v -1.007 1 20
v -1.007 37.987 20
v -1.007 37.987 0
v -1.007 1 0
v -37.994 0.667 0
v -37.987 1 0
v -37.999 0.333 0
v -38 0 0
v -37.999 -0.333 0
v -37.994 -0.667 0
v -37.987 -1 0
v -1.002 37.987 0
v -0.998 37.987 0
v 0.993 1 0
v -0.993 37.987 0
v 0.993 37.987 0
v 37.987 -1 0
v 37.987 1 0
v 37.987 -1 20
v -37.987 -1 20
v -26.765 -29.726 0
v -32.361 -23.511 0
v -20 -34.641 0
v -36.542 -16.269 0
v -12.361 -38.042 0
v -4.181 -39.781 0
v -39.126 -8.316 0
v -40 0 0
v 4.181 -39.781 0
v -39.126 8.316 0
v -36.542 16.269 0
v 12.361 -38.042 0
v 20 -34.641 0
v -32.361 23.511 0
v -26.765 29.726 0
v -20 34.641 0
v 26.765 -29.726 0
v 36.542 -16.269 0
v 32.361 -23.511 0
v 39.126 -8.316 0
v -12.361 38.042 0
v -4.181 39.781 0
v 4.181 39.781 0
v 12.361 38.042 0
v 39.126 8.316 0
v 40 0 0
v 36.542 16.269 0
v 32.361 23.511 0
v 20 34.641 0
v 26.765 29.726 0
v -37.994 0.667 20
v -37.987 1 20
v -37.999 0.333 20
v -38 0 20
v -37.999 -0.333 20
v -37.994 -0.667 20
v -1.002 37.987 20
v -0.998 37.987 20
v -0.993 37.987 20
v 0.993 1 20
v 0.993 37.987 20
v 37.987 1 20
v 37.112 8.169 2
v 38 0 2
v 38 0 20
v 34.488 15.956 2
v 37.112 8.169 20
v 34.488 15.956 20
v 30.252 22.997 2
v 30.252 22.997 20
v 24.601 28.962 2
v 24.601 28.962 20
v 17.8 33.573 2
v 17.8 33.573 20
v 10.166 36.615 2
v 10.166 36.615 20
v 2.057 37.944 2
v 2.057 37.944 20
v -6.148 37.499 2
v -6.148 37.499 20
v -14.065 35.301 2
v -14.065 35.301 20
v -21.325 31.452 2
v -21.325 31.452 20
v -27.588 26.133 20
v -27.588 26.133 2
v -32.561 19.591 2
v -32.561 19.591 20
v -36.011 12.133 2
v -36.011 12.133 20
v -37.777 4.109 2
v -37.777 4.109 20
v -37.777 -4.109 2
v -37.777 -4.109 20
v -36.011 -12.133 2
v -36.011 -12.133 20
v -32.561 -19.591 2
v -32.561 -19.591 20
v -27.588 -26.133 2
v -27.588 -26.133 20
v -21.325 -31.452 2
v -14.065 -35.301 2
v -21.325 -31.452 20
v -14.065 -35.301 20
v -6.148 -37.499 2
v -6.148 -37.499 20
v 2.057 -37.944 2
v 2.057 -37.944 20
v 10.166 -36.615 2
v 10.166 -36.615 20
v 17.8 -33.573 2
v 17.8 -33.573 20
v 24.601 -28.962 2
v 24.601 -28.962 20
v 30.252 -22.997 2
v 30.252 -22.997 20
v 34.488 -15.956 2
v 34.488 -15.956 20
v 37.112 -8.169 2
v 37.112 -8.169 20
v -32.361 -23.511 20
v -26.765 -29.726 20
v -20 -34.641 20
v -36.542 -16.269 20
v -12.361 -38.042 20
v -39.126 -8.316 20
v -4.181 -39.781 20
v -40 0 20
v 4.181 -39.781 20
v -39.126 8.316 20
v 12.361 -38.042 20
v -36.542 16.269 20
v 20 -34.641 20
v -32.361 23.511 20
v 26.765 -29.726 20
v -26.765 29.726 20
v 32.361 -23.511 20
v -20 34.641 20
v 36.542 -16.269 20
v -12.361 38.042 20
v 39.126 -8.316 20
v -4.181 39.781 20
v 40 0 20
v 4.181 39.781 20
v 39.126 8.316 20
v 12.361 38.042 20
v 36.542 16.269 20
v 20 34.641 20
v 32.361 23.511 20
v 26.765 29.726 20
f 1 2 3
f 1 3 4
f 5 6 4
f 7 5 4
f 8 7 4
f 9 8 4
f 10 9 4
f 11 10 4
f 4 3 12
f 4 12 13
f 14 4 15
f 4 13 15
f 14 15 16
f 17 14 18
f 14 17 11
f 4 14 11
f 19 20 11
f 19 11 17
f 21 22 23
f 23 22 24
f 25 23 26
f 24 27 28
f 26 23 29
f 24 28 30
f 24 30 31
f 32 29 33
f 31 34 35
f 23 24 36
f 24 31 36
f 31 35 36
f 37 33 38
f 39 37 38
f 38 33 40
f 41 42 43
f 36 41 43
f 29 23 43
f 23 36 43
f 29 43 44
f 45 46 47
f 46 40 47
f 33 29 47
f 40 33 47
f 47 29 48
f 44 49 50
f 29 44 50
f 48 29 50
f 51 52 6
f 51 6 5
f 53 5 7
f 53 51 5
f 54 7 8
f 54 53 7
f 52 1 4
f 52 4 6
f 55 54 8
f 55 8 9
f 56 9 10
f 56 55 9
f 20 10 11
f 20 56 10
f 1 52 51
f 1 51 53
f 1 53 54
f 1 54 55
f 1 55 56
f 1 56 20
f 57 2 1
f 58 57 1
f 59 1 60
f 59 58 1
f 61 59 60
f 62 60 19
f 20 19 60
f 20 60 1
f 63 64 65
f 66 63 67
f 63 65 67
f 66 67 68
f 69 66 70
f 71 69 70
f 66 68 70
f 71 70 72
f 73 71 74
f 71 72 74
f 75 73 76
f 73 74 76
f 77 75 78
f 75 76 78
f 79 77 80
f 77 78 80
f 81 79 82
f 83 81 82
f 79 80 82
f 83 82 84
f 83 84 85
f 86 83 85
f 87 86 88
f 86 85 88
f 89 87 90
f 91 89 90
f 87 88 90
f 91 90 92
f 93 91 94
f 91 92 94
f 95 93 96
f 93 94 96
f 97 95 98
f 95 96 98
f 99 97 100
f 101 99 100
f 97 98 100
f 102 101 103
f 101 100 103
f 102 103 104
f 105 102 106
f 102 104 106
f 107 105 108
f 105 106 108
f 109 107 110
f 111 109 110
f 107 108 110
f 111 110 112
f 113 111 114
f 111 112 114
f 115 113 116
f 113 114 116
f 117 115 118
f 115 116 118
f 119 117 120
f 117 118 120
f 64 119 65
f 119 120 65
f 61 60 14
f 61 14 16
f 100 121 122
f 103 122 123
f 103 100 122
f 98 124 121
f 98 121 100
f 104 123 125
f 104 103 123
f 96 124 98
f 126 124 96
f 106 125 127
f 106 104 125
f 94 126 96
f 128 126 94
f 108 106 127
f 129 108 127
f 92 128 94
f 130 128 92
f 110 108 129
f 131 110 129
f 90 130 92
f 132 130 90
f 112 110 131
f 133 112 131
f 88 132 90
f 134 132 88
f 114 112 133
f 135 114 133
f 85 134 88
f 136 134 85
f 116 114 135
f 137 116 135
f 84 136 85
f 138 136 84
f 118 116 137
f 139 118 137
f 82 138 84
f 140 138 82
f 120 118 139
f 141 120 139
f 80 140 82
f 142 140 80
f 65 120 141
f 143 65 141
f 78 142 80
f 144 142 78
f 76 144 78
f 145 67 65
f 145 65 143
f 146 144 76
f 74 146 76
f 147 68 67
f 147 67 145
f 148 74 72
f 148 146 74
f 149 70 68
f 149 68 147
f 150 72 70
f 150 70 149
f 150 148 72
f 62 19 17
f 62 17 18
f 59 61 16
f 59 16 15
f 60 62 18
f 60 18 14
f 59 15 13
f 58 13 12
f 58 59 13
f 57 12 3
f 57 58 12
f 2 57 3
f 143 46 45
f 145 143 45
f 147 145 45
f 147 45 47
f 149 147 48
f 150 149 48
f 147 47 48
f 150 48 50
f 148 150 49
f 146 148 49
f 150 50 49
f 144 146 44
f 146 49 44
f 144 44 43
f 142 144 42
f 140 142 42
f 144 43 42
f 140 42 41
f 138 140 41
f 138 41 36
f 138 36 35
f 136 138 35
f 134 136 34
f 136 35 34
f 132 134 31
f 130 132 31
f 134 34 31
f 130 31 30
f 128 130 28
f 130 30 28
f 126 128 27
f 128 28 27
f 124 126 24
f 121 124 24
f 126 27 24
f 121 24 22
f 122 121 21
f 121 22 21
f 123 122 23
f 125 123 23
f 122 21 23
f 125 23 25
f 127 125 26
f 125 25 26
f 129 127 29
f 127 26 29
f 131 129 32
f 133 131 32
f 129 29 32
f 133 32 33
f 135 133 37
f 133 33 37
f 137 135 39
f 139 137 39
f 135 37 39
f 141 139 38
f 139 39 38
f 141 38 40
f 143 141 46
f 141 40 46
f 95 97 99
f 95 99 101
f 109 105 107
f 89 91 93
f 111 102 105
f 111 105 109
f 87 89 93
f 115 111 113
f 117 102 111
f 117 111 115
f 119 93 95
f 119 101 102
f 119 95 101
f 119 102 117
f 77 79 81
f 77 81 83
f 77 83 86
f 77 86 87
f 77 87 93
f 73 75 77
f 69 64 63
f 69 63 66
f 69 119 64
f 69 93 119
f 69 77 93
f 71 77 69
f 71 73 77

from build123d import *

# Parameters (mm, degrees)
F0_R     = 40
F1_DEPTH = 20
F2_R     = 38
F3_DEPTH = 18
F5_DEPTH = 20


with BuildPart() as f1:
    # F0 (on Top) → F1 (new body)
    with BuildSketch(Plane.XY):
        Circle(F0_R)
    extrude(amount=F1_DEPTH)

    # F2 (on face) → F3 (cut)
    with BuildSketch(Plane.XY.offset(20)):
        Circle(F2_R)
    extrude(amount=-F3_DEPTH, mode=Mode.SUBTRACT)


with BuildPart() as f5:
    # F4 (on face) → F5 (new body)
    with BuildSketch(Plane.XY.offset(20)):
        with BuildLine():
            Line((-1.0065800868, 37.986666036), (-1.0065800868, 1))
            Line((-1.0065800868, 1), (0.9934199132, 1))
            Line((0.9934199132, 1), (0.9934199132, 37.9870124763))
            Line((0.9934199132, 37.9870124763), (-0.9934199132, 37.9870124763))
            ThreePointArc((-0.9934199132, 37.9870124763), (-1.000000015, 37.9868398261), (-1.0065800868, 37.986666036))
        make_face()
        with BuildLine():
            ThreePointArc((-37.9868398264, 1), (-37.9967098142, 0.5000432957), (-38, 0))
            ThreePointArc((-38, 0), (-37.9967098142, -0.5000432957), (-37.9868398264, -1))
            Line((-37.9868398264, -1), (37.9868398264, -1))
            Line((37.9868398264, -1), (37.9868398264, 1))
            Line((37.9868398264, 1), (0.9934199132, 1))
            Line((0.9934199132, 1), (-1.0065800868, 1))
            Line((-1.0065800868, 1), (-37.9868398264, 1))
        make_face()
    extrude(amount=-F5_DEPTH)


solid = Compound([f1.part, f5.part])
